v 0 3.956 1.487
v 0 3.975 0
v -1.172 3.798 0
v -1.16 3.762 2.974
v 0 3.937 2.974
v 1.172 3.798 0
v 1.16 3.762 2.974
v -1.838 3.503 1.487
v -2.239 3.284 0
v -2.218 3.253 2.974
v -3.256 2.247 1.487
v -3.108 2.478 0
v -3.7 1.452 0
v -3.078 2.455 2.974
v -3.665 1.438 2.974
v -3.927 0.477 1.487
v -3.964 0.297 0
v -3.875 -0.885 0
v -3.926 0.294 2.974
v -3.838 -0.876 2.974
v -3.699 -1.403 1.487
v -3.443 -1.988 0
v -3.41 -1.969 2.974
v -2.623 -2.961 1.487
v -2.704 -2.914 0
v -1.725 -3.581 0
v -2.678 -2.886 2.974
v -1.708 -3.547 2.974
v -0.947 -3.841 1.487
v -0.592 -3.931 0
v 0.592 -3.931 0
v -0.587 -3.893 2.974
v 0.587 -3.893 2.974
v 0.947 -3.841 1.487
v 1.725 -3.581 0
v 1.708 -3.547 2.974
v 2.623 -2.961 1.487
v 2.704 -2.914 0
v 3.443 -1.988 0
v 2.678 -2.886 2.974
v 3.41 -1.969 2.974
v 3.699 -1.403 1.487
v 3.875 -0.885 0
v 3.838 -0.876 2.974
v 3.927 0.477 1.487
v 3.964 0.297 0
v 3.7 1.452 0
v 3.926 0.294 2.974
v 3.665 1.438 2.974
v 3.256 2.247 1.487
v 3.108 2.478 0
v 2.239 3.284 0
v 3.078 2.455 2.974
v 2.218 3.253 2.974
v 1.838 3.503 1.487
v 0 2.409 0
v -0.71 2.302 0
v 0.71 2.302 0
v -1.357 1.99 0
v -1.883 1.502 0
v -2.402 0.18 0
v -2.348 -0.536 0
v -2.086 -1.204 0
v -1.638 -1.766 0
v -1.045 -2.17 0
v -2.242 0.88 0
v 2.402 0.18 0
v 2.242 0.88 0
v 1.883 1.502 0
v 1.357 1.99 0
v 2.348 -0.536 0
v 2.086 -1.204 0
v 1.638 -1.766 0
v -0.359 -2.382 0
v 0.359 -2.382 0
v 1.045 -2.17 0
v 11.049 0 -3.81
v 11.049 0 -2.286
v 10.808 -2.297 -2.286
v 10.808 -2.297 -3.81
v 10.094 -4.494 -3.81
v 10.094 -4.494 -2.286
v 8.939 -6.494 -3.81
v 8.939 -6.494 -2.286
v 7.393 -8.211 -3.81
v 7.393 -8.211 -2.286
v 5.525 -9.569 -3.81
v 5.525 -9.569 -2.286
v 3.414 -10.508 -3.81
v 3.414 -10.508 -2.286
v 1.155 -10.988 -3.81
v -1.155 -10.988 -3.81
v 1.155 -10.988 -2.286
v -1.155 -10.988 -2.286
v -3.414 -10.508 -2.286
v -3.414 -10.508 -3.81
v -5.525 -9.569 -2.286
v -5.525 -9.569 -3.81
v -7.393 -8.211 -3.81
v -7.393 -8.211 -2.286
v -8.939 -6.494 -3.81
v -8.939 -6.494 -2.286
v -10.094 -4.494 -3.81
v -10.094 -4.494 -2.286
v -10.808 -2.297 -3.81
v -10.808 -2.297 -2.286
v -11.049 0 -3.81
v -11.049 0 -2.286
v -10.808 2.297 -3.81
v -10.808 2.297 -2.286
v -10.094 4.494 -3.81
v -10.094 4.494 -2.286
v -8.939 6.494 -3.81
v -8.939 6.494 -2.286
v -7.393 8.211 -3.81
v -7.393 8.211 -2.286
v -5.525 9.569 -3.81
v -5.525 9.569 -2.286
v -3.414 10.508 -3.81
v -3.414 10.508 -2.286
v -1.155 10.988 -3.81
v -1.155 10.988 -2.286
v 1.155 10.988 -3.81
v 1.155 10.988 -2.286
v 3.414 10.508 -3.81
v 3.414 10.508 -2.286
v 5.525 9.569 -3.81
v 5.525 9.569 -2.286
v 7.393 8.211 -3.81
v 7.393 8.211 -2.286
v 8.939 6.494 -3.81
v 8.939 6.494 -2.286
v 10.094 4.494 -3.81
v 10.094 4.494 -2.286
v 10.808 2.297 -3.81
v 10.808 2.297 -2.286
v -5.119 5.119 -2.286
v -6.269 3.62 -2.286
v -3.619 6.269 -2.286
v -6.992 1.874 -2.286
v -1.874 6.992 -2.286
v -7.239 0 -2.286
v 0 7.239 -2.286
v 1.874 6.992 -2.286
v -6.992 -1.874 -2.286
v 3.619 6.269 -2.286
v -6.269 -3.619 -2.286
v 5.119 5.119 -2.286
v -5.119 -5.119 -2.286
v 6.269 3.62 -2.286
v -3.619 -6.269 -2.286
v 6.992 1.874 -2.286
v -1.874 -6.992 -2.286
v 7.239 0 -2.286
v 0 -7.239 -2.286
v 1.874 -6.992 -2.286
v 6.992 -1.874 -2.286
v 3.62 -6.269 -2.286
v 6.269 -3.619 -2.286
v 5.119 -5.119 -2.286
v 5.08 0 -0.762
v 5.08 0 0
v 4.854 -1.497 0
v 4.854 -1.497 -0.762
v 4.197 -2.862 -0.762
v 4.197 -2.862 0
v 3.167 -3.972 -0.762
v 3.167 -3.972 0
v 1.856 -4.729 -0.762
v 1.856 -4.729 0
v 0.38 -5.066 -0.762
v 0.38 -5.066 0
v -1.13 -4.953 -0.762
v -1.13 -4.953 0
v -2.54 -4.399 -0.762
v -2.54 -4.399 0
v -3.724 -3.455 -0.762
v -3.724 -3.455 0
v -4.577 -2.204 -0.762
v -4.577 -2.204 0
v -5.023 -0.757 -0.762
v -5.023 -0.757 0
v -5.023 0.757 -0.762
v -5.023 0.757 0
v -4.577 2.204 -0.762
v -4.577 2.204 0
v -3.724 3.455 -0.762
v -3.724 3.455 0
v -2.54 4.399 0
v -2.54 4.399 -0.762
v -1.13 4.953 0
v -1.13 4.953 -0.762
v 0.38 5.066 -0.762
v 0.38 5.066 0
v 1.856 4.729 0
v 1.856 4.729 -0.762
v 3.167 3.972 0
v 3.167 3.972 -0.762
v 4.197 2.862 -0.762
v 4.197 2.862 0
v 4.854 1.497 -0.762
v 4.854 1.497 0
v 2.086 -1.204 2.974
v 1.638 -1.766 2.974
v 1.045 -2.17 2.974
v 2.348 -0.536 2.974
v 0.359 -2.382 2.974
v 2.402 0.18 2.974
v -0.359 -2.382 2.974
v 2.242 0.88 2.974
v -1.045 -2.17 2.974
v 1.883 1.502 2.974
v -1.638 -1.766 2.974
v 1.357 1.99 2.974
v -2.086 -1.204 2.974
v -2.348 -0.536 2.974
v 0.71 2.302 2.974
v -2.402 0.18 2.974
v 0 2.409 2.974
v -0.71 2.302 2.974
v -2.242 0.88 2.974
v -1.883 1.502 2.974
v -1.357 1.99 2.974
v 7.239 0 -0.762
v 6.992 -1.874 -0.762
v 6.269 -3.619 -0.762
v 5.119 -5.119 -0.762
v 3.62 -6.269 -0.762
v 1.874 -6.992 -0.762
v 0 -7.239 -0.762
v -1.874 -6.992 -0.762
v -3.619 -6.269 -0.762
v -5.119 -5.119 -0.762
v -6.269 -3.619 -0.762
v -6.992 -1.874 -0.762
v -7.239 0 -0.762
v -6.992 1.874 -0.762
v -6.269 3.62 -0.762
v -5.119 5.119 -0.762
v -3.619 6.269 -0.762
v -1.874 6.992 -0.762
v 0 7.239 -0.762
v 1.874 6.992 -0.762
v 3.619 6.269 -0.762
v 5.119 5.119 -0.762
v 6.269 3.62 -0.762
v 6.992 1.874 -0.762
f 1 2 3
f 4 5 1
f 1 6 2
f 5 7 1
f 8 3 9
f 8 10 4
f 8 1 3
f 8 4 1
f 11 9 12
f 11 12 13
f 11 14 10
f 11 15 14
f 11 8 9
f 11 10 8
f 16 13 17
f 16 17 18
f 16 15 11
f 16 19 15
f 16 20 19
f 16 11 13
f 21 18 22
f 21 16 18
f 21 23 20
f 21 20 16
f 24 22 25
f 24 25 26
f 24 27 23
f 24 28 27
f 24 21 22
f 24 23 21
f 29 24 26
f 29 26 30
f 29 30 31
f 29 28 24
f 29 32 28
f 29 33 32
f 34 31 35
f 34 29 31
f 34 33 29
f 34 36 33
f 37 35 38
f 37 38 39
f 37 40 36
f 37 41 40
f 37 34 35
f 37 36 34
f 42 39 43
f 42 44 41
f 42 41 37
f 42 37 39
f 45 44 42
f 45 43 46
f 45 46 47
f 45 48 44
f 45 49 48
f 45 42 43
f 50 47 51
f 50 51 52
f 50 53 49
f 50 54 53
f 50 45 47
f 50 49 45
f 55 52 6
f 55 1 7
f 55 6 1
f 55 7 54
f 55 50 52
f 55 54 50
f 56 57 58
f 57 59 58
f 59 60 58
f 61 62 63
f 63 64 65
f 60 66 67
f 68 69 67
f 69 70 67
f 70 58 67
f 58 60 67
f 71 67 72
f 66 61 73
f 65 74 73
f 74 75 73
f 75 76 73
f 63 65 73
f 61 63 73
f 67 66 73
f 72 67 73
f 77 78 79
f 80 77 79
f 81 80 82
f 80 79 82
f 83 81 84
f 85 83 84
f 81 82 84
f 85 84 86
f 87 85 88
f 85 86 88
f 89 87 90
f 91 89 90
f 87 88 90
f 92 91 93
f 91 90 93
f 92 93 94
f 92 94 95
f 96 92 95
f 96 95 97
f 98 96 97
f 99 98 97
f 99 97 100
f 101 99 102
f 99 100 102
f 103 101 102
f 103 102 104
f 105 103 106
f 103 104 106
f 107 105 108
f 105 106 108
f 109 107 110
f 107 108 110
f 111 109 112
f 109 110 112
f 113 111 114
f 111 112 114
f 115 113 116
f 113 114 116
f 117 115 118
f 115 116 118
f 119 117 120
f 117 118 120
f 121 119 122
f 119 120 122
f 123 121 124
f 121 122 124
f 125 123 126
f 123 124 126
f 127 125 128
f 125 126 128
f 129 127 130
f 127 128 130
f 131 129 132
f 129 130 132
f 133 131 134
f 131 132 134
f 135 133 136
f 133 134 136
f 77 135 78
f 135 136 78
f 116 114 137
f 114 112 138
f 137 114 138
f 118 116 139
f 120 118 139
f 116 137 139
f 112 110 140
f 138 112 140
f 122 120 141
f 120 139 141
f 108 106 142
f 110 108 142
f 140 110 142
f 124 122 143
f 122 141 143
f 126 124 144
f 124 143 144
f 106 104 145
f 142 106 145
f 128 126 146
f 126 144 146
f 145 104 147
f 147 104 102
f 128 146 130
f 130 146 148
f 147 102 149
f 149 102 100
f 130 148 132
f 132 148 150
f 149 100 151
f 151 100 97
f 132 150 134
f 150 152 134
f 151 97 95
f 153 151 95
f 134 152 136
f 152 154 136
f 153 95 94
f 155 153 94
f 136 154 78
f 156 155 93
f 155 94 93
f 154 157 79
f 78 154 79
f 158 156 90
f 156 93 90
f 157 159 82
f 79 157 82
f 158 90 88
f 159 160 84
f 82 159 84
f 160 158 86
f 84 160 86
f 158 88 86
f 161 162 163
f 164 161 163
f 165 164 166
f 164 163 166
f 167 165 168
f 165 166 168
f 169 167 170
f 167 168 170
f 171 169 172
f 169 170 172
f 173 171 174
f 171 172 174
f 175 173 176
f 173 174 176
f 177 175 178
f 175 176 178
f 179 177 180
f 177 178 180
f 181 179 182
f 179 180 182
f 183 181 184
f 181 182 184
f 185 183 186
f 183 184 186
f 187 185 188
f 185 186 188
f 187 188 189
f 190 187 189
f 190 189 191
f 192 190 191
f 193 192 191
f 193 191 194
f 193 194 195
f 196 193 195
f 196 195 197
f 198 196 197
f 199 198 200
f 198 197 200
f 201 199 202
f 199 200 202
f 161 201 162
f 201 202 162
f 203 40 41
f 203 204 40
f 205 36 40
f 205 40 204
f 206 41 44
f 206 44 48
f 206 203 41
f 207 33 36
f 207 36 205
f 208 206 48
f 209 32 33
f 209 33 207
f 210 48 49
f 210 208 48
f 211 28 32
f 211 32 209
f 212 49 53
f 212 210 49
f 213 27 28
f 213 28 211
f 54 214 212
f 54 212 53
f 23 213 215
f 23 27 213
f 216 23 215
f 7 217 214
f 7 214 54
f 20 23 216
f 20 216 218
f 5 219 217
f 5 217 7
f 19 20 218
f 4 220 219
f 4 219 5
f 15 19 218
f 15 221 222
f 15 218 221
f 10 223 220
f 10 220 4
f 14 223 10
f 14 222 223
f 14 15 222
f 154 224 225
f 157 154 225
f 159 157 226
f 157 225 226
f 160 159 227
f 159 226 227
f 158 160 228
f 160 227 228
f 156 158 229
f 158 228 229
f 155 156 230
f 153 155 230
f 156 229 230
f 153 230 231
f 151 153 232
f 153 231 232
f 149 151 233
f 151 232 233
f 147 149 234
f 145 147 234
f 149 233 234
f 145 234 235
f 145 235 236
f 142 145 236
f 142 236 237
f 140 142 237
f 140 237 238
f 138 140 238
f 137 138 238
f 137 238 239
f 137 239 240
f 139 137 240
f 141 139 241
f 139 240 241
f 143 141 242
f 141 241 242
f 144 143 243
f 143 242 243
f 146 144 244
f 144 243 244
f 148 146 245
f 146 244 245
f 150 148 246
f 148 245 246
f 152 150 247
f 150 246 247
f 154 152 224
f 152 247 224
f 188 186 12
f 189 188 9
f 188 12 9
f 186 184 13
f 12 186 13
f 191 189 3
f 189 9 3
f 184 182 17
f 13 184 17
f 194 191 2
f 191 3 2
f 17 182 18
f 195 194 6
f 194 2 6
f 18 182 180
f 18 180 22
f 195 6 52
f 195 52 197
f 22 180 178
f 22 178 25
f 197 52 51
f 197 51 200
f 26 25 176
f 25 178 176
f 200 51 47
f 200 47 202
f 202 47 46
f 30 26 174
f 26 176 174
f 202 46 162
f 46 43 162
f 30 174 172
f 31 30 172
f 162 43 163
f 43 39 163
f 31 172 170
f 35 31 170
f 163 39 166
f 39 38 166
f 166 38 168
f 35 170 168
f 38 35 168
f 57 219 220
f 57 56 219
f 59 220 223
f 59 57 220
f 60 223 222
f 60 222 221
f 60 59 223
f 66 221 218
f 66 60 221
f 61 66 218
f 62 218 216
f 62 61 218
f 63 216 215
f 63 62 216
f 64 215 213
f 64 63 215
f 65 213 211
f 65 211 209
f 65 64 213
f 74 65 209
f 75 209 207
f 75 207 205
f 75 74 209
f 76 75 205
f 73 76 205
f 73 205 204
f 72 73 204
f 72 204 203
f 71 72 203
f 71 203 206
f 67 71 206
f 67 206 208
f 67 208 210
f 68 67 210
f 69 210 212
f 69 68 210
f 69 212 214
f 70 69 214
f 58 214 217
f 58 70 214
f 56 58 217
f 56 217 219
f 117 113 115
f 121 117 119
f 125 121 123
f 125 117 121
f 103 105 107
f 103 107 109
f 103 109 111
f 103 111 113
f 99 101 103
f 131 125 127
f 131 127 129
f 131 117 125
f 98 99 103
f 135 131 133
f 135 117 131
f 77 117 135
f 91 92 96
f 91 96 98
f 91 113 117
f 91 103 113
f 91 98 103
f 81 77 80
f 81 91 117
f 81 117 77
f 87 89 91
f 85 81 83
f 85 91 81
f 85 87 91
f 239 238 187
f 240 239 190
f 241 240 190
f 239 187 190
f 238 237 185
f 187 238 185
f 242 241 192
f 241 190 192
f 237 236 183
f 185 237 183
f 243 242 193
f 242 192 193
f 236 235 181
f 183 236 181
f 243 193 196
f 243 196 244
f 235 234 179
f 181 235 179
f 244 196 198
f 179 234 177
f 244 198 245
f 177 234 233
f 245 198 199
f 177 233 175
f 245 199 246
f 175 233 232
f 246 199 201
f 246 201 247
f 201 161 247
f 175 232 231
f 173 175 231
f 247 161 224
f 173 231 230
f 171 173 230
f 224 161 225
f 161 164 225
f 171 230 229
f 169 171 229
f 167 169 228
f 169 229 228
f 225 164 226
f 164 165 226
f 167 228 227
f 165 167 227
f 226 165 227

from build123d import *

# Parameters (mm, degrees)
F2_R      = 3.937
F2_R_2    = 2.667
F3_DEPTH  = 2.794
F4_R      = 5.08
F5_DEPTH  = 0.762
F6_R      = 7.239
F7_DEPTH  = 1.524
F9_R      = 11.049
F10_DEPTH = 1.524


with BuildPart() as f1:
    # F0 (on Right) → F1 (revolve)
    with BuildSketch(Plane.YZ):
        Polygon((2.4085466543, 2.8091624185), (2.4085466543, 0), (3.9751, 0), (3.937, 2.9743337072), (2.4085466543, 2.9743337072), align=None)
    revolve(axis=Axis((0, 0, 1.4871668536), (0, 0, 1)))



with BuildPart() as f3:
    # F2 (on Top) → F3 (new body)
    with BuildSketch(Plane.XY):
        Circle(F2_R)
        Circle(F2_R_2, mode=Mode.SUBTRACT)
    extrude(amount=F3_DEPTH)


with BuildPart() as f5:
    # F4 (on face) → F5 (new body)
    with BuildSketch(Plane(origin=(0, 0, 0), x_dir=(1, 0, 0), z_dir=(0, 0, -1))):
        Circle(F4_R)
    extrude(amount=F5_DEPTH)

    # F6 (on face) → F7 (join)
    with BuildSketch(Plane(origin=(0, 0, -0.762), x_dir=(1, 0, 0), z_dir=(0, 0, -1))):
        Circle(F6_R)
    extrude(amount=F7_DEPTH)


with BuildPart() as f1_1:
    add(f1.part)

    add(f5.part)  # F10 merges F5
    # F9 (on face) → F10 (join)
    with BuildSketch(Plane(origin=(0, 0, -2.286), x_dir=(1, 0, 0), z_dir=(0, 0, -1))):
        Circle(F9_R)
    extrude(amount=F10_DEPTH)


solid = f1_1.part
